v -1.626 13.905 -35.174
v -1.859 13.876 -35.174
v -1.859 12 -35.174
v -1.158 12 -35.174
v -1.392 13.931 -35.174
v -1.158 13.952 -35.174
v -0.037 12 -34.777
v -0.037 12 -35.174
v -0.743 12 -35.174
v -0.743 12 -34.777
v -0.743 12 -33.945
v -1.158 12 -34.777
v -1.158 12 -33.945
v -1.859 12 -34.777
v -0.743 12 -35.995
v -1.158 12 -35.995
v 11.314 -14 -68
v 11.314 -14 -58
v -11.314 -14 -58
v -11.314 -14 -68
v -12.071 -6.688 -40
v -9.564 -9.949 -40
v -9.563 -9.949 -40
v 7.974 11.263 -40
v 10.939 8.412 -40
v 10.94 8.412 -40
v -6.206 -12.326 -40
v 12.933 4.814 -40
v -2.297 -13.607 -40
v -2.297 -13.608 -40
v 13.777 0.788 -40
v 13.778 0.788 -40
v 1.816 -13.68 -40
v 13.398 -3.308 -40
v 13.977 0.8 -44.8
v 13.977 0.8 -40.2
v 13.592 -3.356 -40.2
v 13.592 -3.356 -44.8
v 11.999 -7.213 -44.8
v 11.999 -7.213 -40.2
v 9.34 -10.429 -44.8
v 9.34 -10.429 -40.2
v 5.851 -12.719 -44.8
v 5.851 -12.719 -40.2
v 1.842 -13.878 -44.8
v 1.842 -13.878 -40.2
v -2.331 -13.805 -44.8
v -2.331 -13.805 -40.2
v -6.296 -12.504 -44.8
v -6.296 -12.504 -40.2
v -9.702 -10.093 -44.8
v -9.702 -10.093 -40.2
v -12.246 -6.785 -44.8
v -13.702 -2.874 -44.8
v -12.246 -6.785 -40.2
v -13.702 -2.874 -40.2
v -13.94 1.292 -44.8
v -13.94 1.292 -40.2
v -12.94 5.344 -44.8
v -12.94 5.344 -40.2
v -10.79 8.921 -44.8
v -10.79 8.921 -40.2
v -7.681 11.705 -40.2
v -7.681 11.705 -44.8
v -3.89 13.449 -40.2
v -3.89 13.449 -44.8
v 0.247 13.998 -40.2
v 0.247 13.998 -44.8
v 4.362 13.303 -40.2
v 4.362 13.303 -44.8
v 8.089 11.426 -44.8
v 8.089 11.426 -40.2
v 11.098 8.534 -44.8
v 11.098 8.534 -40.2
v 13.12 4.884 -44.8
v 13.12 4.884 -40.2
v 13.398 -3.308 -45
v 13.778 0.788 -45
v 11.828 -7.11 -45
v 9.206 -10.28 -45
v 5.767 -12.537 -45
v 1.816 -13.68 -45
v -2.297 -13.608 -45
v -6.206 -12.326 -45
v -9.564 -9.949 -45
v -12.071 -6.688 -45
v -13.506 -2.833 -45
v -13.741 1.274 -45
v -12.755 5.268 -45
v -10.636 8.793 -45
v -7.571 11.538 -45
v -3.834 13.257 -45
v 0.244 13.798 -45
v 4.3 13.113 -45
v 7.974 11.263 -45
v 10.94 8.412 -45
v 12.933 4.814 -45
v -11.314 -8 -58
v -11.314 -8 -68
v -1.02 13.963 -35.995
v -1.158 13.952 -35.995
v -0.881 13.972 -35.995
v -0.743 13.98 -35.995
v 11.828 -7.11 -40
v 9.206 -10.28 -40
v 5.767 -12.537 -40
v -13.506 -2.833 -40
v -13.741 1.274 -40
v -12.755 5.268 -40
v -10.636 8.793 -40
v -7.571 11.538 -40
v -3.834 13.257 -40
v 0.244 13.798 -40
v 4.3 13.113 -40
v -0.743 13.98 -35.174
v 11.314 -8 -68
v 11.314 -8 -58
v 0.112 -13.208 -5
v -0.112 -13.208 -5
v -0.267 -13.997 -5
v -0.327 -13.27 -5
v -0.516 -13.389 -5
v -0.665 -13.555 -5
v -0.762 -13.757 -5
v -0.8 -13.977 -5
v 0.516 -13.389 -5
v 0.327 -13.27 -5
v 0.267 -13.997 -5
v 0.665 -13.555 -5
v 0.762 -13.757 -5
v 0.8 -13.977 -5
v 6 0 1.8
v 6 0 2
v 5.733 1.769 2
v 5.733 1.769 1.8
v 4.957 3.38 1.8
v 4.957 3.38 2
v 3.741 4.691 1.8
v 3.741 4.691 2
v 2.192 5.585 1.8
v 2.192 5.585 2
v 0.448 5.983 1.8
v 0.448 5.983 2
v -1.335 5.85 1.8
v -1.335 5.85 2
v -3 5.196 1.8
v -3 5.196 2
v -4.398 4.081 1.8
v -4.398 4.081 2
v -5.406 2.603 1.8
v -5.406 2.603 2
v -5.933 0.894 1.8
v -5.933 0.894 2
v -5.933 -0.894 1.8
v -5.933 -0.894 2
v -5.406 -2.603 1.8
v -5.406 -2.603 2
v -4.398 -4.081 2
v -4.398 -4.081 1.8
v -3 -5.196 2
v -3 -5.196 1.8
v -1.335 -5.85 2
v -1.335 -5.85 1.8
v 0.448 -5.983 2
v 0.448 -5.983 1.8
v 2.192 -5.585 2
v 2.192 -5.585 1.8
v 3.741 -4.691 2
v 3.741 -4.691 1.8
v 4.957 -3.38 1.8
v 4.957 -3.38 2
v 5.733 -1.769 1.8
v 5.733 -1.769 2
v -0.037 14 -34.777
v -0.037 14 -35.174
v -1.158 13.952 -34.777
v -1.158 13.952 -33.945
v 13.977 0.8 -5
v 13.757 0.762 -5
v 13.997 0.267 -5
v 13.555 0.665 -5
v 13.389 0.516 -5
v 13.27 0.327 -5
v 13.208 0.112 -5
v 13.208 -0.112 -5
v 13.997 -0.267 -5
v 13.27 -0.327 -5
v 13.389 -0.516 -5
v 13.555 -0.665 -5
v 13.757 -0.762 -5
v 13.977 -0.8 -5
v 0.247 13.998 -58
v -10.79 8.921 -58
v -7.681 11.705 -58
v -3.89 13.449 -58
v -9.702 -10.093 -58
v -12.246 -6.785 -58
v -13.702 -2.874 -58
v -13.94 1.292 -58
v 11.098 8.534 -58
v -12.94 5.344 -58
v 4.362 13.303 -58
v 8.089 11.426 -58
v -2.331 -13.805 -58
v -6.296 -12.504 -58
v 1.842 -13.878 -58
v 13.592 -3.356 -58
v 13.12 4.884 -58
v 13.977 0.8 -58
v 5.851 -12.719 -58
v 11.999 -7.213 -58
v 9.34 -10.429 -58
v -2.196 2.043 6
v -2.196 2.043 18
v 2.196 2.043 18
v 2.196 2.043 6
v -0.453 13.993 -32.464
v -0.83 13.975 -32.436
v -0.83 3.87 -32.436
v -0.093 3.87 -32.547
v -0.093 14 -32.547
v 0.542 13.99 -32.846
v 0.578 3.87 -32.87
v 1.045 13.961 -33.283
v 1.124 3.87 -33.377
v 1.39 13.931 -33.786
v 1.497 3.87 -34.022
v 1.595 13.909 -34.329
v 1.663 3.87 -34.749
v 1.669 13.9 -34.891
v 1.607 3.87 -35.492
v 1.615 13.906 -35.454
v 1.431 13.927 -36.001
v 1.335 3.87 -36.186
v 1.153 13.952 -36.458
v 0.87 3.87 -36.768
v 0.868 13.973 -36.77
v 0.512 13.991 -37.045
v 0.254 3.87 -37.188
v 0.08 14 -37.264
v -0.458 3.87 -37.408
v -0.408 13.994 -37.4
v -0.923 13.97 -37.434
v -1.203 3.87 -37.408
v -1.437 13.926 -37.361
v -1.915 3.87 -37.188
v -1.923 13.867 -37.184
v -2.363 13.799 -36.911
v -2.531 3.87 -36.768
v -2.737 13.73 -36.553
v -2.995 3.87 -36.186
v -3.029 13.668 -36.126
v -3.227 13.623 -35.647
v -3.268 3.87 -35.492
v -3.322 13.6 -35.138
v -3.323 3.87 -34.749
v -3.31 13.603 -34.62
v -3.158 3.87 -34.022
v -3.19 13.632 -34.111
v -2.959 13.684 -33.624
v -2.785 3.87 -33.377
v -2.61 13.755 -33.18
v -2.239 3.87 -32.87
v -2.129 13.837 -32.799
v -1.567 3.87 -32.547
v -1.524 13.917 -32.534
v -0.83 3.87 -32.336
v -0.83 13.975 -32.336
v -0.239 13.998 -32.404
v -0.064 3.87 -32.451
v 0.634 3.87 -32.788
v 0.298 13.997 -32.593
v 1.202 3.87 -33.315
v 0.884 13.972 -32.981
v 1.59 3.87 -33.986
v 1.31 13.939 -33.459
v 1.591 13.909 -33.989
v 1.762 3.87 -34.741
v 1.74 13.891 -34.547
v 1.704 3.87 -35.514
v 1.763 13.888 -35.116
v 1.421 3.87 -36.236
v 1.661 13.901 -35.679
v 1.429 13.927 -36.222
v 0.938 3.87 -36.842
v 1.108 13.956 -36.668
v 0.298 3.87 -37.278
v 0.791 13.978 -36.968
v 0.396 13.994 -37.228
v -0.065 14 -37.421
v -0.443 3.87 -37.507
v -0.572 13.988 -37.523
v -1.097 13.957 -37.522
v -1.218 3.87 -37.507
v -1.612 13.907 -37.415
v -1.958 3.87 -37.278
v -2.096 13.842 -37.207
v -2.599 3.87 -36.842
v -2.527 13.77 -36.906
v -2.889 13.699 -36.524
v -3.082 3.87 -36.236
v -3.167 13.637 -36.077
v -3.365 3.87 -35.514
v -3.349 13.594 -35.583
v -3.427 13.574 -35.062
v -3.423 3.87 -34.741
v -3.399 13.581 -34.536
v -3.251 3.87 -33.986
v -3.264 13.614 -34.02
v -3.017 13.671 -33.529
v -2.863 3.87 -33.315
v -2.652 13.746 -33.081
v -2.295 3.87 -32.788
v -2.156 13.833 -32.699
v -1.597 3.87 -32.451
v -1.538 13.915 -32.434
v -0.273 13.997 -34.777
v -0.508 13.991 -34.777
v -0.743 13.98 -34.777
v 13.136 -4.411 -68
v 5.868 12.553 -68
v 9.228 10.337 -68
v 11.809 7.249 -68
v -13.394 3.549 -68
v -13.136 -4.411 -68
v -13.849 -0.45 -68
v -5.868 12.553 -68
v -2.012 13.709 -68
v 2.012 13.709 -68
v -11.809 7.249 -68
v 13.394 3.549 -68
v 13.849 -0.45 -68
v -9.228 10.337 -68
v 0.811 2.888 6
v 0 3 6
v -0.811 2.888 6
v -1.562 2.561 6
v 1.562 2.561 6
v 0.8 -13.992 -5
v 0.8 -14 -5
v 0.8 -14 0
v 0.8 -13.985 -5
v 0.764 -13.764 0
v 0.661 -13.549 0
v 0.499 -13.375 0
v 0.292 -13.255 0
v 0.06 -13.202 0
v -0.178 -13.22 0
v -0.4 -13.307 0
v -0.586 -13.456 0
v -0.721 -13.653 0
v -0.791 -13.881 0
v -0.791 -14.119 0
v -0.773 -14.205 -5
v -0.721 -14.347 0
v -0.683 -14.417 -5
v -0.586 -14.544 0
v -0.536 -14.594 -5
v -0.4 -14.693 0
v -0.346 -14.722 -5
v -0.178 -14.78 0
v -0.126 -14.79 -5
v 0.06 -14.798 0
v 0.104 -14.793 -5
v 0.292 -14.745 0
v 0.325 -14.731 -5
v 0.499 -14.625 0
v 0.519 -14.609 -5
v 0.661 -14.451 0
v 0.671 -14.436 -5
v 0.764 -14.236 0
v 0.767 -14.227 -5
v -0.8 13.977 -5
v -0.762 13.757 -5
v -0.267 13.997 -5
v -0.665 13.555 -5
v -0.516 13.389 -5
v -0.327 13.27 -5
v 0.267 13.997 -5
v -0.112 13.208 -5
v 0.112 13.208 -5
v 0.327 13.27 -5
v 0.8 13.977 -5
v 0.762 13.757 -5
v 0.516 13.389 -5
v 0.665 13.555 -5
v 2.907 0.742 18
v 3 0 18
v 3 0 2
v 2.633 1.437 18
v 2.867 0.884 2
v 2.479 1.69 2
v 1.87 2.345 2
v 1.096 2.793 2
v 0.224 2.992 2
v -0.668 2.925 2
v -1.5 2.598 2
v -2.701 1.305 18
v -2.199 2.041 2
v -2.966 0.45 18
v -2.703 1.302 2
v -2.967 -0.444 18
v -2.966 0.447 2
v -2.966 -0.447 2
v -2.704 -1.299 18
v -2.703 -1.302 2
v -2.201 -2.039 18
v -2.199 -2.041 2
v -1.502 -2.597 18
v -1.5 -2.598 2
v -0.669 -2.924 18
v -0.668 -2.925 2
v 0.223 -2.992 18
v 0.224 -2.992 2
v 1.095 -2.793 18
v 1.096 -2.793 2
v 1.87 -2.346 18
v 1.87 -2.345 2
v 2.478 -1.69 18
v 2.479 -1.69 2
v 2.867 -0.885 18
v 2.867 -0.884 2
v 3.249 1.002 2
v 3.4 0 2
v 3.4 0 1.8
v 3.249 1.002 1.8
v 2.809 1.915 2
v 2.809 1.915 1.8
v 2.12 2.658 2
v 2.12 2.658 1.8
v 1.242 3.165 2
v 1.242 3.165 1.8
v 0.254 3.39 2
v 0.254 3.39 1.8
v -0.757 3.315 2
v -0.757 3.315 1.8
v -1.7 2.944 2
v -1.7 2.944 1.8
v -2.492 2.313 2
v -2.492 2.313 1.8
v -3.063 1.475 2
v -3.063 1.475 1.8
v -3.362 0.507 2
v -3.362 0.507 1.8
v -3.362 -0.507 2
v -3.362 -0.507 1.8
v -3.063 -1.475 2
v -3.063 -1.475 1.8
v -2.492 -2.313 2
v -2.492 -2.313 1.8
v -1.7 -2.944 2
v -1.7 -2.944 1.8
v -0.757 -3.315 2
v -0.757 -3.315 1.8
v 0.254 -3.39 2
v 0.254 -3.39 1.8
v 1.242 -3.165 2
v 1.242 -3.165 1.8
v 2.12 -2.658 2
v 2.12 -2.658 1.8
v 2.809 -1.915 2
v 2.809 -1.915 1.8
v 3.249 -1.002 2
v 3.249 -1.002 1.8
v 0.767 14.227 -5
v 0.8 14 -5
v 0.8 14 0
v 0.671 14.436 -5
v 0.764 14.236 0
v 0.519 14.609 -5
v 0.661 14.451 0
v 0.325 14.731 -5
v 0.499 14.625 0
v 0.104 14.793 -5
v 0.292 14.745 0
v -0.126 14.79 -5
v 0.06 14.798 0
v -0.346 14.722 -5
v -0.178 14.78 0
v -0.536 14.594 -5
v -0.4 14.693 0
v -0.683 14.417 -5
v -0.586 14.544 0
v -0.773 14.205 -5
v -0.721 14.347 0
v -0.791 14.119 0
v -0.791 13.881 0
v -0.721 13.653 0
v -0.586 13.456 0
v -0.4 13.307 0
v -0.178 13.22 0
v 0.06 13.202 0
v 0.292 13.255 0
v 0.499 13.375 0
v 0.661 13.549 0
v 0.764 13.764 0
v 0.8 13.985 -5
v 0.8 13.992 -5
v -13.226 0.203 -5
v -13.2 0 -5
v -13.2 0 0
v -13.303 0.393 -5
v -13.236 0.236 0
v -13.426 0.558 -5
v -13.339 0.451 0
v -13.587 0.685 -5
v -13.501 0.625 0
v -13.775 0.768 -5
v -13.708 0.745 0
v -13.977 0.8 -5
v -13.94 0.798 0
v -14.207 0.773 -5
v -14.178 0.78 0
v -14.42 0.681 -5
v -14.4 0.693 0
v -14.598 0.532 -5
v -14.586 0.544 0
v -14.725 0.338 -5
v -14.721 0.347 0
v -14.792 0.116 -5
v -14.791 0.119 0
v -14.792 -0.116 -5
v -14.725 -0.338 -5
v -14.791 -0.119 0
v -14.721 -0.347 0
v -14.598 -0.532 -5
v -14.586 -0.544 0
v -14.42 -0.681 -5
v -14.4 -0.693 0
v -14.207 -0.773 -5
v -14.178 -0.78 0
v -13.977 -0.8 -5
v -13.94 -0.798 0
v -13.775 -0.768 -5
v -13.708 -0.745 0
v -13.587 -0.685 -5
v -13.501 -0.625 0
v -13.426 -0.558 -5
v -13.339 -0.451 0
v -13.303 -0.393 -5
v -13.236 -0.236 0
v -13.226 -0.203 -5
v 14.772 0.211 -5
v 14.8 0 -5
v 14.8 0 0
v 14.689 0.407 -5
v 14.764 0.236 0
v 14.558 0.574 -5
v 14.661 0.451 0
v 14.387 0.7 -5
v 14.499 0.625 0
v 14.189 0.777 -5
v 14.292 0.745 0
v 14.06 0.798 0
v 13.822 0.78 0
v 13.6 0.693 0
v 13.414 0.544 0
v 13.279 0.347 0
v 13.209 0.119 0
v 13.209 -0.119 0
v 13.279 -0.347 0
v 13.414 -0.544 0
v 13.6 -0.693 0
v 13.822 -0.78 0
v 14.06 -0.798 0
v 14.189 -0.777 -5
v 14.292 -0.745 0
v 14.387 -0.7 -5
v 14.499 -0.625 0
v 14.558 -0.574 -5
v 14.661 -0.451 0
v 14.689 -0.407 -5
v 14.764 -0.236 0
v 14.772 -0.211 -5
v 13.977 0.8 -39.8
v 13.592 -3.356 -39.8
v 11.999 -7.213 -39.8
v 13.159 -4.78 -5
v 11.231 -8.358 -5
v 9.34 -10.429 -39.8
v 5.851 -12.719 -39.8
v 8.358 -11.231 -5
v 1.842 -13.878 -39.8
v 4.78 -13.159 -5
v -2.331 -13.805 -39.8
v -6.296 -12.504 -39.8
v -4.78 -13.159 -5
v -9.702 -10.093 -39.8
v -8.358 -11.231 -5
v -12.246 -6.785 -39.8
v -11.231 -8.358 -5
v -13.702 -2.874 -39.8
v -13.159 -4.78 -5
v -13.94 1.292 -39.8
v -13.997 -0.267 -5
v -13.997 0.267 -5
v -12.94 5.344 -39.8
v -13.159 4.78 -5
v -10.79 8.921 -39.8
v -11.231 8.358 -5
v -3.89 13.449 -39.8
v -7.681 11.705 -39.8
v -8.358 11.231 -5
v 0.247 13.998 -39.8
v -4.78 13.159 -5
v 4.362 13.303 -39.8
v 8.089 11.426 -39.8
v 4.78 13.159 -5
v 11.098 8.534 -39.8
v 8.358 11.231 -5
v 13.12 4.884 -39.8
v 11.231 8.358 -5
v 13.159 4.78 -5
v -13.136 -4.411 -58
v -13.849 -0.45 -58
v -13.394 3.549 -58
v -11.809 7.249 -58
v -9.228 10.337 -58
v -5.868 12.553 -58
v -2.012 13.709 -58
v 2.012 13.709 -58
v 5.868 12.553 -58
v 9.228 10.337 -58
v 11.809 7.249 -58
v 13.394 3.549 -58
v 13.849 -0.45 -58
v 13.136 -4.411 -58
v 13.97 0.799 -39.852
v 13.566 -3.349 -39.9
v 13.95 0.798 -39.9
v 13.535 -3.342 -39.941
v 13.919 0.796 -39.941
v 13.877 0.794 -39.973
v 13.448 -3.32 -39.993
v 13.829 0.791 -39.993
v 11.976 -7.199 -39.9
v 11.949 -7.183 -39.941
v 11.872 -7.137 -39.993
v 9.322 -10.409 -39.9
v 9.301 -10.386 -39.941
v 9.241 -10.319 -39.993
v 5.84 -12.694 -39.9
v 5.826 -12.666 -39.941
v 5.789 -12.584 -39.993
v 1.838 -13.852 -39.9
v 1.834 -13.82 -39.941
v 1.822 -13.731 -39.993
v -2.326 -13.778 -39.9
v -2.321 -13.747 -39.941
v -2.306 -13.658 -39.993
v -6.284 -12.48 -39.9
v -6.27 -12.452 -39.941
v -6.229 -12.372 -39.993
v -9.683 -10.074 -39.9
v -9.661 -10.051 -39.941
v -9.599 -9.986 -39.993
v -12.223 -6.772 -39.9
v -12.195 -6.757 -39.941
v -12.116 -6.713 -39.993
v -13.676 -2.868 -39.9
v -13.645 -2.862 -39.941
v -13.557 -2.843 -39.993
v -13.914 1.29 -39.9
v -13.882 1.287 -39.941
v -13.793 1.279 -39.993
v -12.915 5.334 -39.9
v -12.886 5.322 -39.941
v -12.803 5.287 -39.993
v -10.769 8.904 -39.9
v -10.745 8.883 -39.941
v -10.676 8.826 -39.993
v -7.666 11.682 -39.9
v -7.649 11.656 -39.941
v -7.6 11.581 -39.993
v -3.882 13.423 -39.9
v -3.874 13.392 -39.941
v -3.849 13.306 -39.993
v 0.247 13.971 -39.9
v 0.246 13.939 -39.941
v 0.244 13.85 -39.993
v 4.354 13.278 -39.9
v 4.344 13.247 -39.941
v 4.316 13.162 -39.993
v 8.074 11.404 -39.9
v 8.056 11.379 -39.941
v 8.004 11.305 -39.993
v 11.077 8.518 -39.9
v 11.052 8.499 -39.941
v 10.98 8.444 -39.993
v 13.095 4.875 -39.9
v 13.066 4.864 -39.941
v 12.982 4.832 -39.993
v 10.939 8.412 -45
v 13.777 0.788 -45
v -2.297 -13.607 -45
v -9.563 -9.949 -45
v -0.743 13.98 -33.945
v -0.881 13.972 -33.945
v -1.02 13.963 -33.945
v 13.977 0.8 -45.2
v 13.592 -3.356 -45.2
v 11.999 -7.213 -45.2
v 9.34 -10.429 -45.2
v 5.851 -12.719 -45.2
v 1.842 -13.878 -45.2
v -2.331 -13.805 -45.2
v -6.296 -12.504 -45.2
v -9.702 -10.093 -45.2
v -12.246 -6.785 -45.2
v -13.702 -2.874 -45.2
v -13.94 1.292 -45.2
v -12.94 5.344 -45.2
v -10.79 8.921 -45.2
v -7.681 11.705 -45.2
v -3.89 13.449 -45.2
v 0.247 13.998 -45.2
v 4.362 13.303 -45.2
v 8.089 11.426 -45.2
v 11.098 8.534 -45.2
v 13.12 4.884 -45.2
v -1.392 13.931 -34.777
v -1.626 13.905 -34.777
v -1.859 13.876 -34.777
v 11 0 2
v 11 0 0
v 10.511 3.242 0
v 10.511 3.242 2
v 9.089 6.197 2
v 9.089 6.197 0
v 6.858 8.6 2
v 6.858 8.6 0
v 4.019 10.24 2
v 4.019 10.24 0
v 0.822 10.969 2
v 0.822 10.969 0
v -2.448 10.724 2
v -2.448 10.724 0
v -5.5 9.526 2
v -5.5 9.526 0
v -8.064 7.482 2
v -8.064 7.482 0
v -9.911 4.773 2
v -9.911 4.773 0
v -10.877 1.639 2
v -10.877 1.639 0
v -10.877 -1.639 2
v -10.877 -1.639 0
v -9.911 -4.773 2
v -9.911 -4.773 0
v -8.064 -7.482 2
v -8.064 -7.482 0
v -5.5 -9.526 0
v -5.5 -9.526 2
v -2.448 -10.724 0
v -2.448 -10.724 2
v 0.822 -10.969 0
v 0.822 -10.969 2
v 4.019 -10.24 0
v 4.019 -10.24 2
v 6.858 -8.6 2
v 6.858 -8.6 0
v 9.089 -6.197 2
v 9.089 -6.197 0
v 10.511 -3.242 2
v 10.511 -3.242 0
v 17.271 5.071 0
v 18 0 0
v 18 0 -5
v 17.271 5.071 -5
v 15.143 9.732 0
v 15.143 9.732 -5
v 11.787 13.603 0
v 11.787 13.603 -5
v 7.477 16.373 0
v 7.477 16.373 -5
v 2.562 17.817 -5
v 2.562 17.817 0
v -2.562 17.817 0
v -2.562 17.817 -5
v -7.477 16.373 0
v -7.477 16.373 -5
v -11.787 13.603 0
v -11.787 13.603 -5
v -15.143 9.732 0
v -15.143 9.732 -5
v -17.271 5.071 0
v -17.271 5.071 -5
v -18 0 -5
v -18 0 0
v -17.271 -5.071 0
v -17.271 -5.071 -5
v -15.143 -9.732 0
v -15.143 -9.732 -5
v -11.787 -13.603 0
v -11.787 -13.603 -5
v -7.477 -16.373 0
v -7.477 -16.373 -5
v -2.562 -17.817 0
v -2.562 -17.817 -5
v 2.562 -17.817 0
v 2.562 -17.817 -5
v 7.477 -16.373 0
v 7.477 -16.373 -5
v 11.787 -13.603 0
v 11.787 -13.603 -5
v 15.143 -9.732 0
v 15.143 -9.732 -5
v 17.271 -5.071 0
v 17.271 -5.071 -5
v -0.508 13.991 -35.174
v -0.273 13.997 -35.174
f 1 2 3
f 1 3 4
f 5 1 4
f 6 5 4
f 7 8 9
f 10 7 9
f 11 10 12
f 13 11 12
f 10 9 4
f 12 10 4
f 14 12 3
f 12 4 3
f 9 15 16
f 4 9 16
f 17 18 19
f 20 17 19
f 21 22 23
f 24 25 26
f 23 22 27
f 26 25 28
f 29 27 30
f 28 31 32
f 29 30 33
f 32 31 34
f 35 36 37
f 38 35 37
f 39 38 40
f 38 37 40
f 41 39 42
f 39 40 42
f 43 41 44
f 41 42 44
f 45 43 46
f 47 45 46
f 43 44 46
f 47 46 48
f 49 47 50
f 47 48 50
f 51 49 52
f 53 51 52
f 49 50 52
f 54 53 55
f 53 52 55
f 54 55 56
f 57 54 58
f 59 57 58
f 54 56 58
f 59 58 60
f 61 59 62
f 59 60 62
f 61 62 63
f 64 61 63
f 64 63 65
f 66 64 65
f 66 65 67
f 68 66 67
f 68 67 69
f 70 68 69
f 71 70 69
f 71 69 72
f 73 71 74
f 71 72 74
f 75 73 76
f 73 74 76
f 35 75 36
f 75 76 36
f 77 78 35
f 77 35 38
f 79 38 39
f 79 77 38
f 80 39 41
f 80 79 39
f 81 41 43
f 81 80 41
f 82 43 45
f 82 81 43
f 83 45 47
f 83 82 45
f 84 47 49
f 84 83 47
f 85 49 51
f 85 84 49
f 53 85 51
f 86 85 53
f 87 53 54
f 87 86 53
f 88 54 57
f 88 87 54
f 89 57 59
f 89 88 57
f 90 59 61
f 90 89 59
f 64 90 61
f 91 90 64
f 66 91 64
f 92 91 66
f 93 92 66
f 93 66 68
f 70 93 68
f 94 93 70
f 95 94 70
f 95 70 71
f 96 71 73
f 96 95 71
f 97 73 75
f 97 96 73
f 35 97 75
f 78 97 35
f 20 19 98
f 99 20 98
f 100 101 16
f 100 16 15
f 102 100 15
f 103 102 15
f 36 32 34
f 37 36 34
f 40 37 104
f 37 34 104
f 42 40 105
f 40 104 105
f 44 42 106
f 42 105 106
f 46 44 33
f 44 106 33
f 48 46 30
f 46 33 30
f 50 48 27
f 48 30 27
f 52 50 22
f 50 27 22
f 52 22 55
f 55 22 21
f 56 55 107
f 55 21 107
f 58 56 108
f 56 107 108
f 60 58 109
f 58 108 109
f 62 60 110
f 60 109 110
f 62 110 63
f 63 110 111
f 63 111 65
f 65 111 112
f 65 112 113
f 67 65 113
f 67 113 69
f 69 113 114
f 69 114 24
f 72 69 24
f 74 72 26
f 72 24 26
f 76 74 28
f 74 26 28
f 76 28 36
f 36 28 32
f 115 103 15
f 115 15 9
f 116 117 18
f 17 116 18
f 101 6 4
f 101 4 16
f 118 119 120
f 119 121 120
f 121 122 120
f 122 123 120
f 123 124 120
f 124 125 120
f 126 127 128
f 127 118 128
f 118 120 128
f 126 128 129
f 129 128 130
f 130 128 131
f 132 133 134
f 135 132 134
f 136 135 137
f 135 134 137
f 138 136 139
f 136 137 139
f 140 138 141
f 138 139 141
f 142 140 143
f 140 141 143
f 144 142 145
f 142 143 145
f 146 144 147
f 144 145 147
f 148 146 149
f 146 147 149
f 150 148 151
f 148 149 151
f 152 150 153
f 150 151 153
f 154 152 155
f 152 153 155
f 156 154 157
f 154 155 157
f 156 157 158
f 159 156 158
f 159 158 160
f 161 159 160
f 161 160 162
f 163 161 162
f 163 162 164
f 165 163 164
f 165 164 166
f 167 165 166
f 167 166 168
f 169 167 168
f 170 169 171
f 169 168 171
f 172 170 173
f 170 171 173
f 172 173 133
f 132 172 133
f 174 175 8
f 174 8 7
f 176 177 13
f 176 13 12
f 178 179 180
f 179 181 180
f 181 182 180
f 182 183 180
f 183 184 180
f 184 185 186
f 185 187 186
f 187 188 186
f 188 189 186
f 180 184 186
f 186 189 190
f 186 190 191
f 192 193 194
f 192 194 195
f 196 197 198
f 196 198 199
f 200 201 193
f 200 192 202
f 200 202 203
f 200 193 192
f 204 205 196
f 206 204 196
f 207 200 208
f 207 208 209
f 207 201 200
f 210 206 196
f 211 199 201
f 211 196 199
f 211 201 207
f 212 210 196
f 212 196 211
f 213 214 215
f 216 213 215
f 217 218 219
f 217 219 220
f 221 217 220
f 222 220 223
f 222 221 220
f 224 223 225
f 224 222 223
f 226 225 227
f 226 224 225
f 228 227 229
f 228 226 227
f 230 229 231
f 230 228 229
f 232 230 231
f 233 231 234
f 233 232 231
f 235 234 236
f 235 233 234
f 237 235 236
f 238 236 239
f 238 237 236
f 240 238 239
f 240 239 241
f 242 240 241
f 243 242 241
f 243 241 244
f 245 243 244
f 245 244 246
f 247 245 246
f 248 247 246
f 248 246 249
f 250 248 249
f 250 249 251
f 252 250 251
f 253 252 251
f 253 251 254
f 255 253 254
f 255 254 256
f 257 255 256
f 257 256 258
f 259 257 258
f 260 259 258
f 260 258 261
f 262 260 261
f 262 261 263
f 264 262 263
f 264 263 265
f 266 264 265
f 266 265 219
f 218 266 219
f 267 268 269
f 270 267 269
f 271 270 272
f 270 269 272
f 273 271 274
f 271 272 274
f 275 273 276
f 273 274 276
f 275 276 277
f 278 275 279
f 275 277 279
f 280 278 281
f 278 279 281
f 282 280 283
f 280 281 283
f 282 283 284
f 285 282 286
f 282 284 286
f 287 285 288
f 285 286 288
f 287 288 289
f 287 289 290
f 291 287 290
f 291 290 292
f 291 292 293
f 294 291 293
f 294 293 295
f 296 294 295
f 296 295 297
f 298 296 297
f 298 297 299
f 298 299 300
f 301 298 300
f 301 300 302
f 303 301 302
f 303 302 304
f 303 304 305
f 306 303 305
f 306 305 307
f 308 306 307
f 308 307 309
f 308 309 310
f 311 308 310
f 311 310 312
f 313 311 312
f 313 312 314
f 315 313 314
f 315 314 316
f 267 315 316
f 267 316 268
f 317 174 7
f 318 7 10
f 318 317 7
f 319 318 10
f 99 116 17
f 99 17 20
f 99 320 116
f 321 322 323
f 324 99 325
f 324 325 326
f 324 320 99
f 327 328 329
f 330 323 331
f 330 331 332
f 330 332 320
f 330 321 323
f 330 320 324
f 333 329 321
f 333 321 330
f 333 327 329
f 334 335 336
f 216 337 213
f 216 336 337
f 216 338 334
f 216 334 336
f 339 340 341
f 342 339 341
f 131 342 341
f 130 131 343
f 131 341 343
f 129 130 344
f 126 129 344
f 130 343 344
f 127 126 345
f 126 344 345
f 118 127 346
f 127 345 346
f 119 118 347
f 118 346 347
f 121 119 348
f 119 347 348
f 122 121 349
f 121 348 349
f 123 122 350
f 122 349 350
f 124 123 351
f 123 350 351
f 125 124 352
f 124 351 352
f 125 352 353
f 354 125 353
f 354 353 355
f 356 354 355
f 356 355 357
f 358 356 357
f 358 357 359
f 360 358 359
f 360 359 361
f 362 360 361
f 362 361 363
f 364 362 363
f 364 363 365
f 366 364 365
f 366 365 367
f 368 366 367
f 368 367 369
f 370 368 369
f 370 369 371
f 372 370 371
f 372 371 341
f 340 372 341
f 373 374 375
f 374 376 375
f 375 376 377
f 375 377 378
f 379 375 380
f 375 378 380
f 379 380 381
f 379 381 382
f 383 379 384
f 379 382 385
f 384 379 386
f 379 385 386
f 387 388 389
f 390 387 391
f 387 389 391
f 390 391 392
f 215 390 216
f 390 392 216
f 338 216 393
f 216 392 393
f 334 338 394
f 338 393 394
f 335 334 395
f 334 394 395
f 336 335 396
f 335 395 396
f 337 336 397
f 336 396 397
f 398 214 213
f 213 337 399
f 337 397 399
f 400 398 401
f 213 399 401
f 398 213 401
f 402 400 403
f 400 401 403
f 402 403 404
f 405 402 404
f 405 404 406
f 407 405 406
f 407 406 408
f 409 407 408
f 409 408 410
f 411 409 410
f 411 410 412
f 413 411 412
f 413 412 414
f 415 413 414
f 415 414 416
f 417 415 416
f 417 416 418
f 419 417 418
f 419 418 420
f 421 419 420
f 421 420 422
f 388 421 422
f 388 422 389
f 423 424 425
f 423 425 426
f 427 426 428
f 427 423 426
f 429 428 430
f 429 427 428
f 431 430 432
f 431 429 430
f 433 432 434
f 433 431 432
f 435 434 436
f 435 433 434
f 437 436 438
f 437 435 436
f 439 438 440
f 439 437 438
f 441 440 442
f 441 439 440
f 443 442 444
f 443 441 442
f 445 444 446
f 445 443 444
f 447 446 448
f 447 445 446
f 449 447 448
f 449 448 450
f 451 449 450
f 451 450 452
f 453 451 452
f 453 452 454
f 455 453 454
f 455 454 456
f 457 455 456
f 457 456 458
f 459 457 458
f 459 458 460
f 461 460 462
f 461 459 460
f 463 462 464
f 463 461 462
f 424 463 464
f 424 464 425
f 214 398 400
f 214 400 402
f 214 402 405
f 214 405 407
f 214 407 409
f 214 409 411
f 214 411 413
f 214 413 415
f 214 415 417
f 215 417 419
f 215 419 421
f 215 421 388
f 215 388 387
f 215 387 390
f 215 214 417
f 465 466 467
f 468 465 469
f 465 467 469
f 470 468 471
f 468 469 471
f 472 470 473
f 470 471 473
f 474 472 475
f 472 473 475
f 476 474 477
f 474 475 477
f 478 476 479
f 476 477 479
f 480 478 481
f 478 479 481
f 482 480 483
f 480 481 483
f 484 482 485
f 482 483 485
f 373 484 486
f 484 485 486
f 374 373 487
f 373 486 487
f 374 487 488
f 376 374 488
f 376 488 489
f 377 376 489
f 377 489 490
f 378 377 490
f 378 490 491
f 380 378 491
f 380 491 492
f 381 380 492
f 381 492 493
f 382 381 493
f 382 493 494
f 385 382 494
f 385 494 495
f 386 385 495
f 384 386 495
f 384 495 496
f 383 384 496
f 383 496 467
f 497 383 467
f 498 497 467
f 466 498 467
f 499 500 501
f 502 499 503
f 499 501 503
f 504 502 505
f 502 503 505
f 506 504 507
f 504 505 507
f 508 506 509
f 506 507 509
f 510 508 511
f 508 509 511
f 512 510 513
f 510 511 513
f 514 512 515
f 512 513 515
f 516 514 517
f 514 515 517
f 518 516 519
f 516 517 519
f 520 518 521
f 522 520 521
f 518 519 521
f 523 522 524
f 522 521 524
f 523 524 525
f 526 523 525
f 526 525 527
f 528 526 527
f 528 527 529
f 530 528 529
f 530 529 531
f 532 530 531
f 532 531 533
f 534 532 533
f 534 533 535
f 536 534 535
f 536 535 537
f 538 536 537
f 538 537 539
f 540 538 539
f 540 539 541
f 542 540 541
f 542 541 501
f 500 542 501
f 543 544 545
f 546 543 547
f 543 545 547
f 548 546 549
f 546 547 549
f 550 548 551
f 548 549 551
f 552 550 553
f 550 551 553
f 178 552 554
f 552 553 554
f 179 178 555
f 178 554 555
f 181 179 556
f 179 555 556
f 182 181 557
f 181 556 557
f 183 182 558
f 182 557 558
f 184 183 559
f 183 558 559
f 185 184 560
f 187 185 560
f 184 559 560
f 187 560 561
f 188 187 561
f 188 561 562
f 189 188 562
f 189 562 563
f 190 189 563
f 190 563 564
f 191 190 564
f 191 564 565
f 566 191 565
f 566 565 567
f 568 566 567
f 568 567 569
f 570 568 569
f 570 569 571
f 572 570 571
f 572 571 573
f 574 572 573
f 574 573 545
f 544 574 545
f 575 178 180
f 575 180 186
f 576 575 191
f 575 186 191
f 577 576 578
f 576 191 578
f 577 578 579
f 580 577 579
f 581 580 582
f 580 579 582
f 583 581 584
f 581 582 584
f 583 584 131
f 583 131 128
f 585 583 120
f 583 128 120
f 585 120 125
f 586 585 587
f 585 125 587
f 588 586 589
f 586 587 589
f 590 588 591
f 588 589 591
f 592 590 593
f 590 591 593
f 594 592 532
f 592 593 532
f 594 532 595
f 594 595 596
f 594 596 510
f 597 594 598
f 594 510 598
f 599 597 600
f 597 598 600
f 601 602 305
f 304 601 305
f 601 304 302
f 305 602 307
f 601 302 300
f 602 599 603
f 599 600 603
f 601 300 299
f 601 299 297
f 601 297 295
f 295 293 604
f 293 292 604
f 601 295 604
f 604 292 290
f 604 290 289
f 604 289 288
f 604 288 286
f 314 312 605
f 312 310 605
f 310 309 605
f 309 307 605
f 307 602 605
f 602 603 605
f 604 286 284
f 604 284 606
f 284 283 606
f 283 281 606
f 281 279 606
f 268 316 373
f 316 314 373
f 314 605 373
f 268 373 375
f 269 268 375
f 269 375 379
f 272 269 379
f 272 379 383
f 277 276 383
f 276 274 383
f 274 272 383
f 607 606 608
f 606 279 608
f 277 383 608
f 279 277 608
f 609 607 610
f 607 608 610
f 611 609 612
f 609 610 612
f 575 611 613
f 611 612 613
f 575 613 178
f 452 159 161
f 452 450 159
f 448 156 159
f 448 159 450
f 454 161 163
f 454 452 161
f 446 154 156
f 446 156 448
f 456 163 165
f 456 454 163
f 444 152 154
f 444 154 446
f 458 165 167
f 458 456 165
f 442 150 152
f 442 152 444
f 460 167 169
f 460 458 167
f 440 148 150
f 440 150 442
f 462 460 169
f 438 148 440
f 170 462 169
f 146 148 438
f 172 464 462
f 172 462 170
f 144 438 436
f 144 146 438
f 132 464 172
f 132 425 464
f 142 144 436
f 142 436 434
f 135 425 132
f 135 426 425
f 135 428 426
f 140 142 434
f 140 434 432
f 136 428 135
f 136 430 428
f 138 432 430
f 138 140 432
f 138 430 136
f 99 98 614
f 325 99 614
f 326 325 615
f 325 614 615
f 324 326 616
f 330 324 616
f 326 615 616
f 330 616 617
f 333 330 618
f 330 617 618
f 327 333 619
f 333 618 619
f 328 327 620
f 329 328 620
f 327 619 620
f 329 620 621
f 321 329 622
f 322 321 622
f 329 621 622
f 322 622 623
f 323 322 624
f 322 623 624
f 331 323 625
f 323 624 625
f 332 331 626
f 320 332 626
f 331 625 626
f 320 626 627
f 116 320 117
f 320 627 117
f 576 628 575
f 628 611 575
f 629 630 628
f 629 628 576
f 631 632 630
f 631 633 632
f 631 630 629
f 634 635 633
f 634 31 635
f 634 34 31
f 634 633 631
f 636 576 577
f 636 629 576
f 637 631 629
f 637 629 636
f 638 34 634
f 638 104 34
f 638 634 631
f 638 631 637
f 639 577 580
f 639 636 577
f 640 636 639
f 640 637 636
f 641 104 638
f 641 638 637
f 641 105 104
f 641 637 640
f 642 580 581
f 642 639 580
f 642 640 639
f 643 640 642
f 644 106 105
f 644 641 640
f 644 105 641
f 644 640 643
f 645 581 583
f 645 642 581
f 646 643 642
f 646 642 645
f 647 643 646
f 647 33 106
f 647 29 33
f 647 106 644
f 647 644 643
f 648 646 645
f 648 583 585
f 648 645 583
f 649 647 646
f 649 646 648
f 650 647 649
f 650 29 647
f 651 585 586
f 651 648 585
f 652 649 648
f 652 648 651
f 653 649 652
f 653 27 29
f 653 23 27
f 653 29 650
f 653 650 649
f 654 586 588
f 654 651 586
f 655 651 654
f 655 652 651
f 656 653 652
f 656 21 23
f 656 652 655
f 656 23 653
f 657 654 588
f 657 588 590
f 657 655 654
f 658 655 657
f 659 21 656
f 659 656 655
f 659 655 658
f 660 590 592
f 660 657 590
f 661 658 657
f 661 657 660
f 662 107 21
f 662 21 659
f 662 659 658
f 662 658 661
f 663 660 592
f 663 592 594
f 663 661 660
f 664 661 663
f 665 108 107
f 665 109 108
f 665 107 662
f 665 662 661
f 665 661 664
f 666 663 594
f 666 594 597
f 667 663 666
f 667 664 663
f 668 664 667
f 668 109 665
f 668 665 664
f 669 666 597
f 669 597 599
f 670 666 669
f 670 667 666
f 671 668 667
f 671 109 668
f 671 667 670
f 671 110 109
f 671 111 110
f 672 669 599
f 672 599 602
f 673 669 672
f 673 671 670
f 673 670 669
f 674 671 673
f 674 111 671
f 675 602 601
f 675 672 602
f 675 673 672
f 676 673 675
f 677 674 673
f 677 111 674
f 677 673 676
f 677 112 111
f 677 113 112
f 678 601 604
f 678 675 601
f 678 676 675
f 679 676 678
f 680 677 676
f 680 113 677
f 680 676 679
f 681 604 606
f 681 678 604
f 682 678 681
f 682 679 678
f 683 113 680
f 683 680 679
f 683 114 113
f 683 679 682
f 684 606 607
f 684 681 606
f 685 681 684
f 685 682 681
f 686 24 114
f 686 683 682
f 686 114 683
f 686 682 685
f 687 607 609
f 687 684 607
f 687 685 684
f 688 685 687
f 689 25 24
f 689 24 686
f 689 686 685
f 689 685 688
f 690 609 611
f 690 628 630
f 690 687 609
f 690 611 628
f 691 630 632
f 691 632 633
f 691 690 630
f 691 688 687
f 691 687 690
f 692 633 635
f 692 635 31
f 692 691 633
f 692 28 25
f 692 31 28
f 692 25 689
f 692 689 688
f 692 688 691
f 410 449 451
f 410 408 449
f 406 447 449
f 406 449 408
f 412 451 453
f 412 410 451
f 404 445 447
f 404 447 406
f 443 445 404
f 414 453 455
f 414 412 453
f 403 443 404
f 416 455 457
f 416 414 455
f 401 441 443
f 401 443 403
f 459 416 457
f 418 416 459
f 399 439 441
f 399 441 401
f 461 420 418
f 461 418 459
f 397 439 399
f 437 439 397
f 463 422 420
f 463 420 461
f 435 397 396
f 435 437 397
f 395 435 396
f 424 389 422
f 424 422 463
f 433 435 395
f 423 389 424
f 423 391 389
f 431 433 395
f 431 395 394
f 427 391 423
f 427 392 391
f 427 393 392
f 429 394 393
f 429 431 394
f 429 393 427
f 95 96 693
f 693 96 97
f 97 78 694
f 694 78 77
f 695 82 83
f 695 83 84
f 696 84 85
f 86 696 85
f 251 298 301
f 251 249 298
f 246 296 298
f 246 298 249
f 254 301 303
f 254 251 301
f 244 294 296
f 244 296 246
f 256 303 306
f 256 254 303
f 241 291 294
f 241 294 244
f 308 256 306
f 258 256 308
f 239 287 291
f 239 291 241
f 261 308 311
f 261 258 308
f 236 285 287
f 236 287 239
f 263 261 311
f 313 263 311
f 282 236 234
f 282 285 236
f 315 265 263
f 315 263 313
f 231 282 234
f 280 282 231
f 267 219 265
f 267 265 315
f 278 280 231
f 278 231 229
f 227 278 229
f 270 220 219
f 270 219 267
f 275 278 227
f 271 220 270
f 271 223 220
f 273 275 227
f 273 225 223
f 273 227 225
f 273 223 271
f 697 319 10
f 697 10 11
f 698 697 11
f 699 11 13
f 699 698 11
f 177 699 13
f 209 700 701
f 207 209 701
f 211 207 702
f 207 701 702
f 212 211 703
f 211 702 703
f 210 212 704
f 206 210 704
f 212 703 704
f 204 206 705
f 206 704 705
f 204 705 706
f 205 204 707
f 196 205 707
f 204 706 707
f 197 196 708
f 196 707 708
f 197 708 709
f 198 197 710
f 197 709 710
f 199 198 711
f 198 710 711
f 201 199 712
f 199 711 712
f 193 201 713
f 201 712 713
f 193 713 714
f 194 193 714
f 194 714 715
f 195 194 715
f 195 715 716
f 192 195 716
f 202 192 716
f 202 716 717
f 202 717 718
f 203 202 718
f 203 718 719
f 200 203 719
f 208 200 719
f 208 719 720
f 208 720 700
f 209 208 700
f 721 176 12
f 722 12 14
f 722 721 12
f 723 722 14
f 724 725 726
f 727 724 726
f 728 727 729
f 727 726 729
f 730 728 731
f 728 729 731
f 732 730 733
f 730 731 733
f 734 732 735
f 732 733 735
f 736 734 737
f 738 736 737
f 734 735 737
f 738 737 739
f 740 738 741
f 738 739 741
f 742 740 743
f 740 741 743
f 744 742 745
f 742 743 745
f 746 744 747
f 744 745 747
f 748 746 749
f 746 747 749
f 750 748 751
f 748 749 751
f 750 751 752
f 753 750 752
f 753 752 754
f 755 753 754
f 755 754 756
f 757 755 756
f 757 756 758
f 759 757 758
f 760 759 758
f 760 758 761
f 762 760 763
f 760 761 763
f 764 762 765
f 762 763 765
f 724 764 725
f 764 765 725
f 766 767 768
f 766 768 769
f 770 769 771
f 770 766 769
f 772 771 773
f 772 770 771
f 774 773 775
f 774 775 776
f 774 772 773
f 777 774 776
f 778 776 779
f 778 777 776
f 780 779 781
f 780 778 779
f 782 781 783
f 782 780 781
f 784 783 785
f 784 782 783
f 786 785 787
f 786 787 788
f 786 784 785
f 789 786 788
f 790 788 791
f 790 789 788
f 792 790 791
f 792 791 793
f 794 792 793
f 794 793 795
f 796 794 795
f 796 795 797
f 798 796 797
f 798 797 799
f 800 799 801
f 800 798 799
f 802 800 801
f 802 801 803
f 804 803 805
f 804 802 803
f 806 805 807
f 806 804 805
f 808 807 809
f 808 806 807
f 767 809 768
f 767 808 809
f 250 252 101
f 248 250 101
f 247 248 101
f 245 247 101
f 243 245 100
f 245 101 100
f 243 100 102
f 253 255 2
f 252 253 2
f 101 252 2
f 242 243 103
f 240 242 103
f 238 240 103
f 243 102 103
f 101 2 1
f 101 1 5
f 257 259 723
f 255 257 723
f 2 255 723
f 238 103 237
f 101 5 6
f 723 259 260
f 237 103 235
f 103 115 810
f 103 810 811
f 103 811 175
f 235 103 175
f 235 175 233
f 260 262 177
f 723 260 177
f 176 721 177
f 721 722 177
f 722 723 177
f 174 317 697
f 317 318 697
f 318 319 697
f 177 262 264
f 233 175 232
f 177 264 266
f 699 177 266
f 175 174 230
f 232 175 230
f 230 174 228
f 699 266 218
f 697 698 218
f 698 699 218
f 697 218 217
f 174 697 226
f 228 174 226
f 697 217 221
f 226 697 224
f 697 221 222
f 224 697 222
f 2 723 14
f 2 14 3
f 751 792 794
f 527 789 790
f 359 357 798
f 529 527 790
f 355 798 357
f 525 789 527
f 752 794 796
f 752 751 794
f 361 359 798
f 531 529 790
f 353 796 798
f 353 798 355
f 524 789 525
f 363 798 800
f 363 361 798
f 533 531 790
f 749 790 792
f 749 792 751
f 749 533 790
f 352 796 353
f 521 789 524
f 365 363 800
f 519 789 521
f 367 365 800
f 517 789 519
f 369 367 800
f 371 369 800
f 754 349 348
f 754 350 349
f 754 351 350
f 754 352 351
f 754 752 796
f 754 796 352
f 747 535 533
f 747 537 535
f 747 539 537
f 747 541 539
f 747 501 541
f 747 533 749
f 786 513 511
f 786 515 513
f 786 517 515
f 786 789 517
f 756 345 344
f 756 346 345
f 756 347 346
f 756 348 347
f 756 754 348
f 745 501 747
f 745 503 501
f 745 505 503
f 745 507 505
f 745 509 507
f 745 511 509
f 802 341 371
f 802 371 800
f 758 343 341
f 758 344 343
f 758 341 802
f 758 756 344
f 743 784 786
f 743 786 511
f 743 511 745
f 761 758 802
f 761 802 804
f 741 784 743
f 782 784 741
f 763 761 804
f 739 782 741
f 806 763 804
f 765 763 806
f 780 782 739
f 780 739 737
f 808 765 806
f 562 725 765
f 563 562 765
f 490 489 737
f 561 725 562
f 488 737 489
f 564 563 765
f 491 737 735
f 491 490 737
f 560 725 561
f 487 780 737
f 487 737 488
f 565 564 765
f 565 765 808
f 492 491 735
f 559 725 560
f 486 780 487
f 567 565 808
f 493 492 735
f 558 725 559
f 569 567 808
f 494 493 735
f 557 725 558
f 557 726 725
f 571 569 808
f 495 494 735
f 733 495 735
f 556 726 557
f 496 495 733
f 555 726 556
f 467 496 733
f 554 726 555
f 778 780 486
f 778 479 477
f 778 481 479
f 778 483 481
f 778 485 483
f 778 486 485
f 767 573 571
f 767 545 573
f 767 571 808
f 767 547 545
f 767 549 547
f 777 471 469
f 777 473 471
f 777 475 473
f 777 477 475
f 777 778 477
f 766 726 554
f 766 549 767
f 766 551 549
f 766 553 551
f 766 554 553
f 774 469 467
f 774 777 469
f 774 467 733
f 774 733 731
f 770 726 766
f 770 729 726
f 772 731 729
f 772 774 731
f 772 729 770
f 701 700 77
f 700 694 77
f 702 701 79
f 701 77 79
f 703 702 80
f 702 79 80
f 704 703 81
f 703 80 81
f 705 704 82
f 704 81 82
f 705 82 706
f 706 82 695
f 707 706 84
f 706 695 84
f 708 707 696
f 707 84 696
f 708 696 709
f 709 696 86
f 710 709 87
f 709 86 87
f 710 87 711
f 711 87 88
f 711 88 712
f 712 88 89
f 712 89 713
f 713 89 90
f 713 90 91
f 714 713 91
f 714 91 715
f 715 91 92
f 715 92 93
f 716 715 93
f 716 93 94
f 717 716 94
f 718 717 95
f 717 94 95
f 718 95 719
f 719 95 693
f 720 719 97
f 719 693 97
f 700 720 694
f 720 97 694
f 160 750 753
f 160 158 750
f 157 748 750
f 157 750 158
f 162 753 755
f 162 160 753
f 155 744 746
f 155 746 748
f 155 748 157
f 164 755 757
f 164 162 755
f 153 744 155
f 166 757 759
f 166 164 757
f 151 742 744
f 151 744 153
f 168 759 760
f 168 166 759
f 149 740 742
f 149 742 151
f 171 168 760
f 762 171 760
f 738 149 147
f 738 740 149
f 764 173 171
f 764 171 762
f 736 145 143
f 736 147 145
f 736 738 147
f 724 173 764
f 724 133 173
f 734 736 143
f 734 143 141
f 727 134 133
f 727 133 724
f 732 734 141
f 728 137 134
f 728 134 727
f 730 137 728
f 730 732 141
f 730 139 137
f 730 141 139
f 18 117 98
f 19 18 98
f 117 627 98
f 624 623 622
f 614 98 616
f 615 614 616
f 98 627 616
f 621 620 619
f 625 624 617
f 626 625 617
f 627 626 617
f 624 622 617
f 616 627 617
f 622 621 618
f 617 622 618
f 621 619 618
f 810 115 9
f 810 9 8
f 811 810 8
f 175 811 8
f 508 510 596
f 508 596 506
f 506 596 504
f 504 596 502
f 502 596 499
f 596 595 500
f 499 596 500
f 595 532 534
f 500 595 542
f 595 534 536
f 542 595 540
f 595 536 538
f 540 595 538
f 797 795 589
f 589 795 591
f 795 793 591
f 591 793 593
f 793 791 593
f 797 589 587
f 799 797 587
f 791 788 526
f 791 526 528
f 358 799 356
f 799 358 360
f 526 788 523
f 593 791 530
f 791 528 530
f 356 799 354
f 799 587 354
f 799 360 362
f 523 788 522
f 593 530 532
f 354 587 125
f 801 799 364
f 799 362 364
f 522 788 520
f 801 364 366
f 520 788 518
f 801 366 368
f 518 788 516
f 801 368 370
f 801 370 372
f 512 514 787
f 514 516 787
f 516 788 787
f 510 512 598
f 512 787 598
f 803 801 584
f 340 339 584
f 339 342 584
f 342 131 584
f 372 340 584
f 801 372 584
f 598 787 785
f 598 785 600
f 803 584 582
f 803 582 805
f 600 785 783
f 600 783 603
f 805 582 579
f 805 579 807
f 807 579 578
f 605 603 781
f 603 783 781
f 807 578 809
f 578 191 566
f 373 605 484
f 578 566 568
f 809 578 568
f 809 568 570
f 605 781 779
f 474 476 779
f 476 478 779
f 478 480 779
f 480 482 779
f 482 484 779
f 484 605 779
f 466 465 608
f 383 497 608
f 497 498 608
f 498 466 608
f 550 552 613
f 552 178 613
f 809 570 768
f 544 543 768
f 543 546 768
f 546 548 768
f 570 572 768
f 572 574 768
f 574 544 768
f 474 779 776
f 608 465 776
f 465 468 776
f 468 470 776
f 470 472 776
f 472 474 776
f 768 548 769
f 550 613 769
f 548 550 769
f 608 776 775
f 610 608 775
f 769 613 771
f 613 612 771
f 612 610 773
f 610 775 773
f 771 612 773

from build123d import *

# Parameters (mm, degrees)
SKETCH1_R                   = 18
BOSS_EXTRUDE2_DEPTH         = 5
SKETCH1_4_R                 = 11
BOSS_EXTRUDE3_DEPTH         = 2
SKETCH2_R                   = 3
BOSS_EXTRUDE4_DEPTH         = 16
SKETCH3_W                   = 6.362998302
SKETCH3_H                   = 1.749824533
CUT_EXTRUDE1_DEPTH          = 12
SKETCH4_R                   = 6
SKETCH4_R_2                 = 3.4
CUT_EXTRUDE2_DEPTH          = 0.2
TAP_DRILL_FOR_M2X0_4_TAP1_D = 1.6
SKETCH5_R                   = 14
BOSS_EXTRUDE5_DEPTH         = 35
FILLET2_R                   = 0.2
SKETCH7_R                   = 14
BOSS_EXTRUDE6_DEPTH         = 5
CHAMFER1_SIZE               = 0.2
SKETCH10_R                  = 14
BOSS_EXTRUDE7_DEPTH         = 13
CHAMFER2_SIZE               = 0.2
BOSS_EXTRUDE8_DEPTH         = 10
SKETCH12_R                  = 2.6
SKETCH12_R_2                = 2.5
CUT_EXTRUDE3_DEPTH          = 10.13
CUT_EXTRUDE4_DEPTH          = 2


# Some blends are built 0.0001 mm under size
with BuildPart() as part:
    # Sketch1 → Boss-Extrude2 (new body)
    with BuildSketch(Plane.XY):
        Circle(SKETCH1_R)
    extrude(amount=-BOSS_EXTRUDE2_DEPTH)

    # Sketch1<4> → Boss-Extrude3 (add)
    with BuildSketch(Plane.XY):
        Circle(SKETCH1_4_R)
    extrude(amount=BOSS_EXTRUDE3_DEPTH)

    # Sketch2 → Boss-Extrude4 (add)
    with BuildSketch(Plane.XY.offset(2)):
        Circle(SKETCH2_R)
    extrude(amount=BOSS_EXTRUDE4_DEPTH)

    # Sketch3 → Cut-Extrude1 (cut)
    with BuildSketch(Plane.XY.offset(18)):
        with Locations((0.265444357, 2.918366652)):
            Rectangle(SKETCH3_W, SKETCH3_H)
    extrude(amount=-CUT_EXTRUDE1_DEPTH, mode=Mode.SUBTRACT)

    # Sketch4 → Cut-Extrude2 (cut)
    with BuildSketch(Plane.XY.offset(2)):
        Circle(SKETCH4_R)
        Circle(SKETCH4_R_2, mode=Mode.SUBTRACT)
    extrude(amount=-CUT_EXTRUDE2_DEPTH, mode=Mode.SUBTRACT)

    # Tap Drill for M2x0.4 Tap1 (through all)
    with Locations(Plane(origin=(0, 14, -5), x_dir=(-1, 0, 0), z_dir=(0, 0, -1))):
        with Locations((0, 0), (-14, -14), (0, -28), (14, -14)):
            Hole(TAP_DRILL_FOR_M2X0_4_TAP1_D / 2)

    # Sketch5 → Boss-Extrude5 (add)
    with BuildSketch(Plane(origin=(0, 0, -5), x_dir=(-1, 0, 0), z_dir=(0, 0, -1))):
        with Locations(Location((0, 0, 0), (0, 0, 176.725509844))):
            Circle(SKETCH5_R)
    extrude(amount=BOSS_EXTRUDE5_DEPTH)

    # Fillet2
    fillet2_edges = [part.edges().sort_by_distance(p)[0] for p in [
        (-13.977142857, -0.799673403, -40),
    ]]
    fillet(fillet2_edges, radius=FILLET2_R)

    # Sketch7 → Boss-Extrude6 (add)
    with BuildSketch(Plane(origin=(0, 0, -40), x_dir=(-1, 0, 0), z_dir=(0, 0, -1))):
        with Locations(Location((0, 0, 0), (0, 0, 176.725509844))):
            Circle(SKETCH7_R)
    extrude(amount=BOSS_EXTRUDE6_DEPTH)

    # Chamfer1
    chamfer1_edges = [part.edges().sort_by_distance(p)[0] for p in [
        (-13.977142857, -0.799673403, -40),
        (-13.977142857, -0.799673403, -45),
    ]]
    chamfer(chamfer1_edges, length=CHAMFER1_SIZE - 0.0001)  # a hair under: the kernel refuses the full size

    # Sketch10 → Boss-Extrude7 (add)
    with BuildSketch(Plane(origin=(0, 0, -45), x_dir=(-1, 0, 0), z_dir=(0, 0, -1))):
        with Locations(Location((0, 0, 0), (0, 0, 176.725509844))):
            Circle(SKETCH10_R)
    extrude(amount=BOSS_EXTRUDE7_DEPTH)

    # Chamfer2
    # the kernel refuses this chamfer: 0.2 mm, written as the material it takes off along each edge
    with BuildSketch(Plane(origin=(0, 0, -45), x_dir=(0.9983673469383324, 0.057119528773576726, 0), z_dir=(-0.057119528773576726, 0.9983673469383324, 0))) as chamfer2_piece_1:
        Polygon((14, CHAMFER2_SIZE), (14 - CHAMFER2_SIZE, 0), (14, 0), align=None)
    revolve(axis=Axis((0, 0, -45), (0, 0, -1)), mode=Mode.SUBTRACT)

    # Sketch12 → Cut-Extrude3 (cut)
    with BuildSketch(Plane(origin=(0, 14, 0), x_dir=(1, 0, 0), z_dir=(0, 1, 0))):
        with Locations(Location((-0.830324238, 34.935733276, 0), (0, 0, 270))):
            Circle(SKETCH12_R)
        with Locations(Location((-0.830324238, 34.935733276, 0), (0, 0, 270))):
            Circle(SKETCH12_R_2, mode=Mode.SUBTRACT)
    extrude(amount=-CUT_EXTRUDE3_DEPTH, mode=Mode.SUBTRACT)

    # Sketch13 → Cut-Extrude4 (cut)
    with BuildSketch(Plane(origin=(0, 14, 0), x_dir=(1, 0, 0), z_dir=(0, 1, 0))):
        Polygon((-0.743156629, 35.174011268), (-0.037154138, 35.174011268), (-0.037154138, 34.777385043), (-0.743156629, 34.777385043), (-0.743156629, 33.944764058), (-1.157734464, 33.944764058), (-1.157734464, 34.777385043), (-1.858828415, 34.777385043), (-1.858828415, 35.174011268), (-1.157734464, 35.174011268), (-1.157734464, 35.994600549), (-0.743156629, 35.994600549), align=None)
    extrude(amount=-CUT_EXTRUDE4_DEPTH, mode=Mode.SUBTRACT)


with BuildPart() as body_2:
    # Sketch11 → Boss-Extrude8 (new body)
    with BuildSketch(Plane(origin=(0, 0, -58), x_dir=(-1, 0, 0), z_dir=(0, 0, -1))):
        with BuildLine():
            Line((-11.313708499, -8), (-11.313708499, -14))
            Line((-11.313708499, -14), (11.313708499, -14))
            Line((11.313708499, -14), (11.313708499, -8))
            ThreePointArc((11.313708499, -8), (0, 13.856406461), (-11.313708499, -8))
        make_face()
    extrude(amount=BOSS_EXTRUDE8_DEPTH)


solid = Compound([part.part, body_2.part])
